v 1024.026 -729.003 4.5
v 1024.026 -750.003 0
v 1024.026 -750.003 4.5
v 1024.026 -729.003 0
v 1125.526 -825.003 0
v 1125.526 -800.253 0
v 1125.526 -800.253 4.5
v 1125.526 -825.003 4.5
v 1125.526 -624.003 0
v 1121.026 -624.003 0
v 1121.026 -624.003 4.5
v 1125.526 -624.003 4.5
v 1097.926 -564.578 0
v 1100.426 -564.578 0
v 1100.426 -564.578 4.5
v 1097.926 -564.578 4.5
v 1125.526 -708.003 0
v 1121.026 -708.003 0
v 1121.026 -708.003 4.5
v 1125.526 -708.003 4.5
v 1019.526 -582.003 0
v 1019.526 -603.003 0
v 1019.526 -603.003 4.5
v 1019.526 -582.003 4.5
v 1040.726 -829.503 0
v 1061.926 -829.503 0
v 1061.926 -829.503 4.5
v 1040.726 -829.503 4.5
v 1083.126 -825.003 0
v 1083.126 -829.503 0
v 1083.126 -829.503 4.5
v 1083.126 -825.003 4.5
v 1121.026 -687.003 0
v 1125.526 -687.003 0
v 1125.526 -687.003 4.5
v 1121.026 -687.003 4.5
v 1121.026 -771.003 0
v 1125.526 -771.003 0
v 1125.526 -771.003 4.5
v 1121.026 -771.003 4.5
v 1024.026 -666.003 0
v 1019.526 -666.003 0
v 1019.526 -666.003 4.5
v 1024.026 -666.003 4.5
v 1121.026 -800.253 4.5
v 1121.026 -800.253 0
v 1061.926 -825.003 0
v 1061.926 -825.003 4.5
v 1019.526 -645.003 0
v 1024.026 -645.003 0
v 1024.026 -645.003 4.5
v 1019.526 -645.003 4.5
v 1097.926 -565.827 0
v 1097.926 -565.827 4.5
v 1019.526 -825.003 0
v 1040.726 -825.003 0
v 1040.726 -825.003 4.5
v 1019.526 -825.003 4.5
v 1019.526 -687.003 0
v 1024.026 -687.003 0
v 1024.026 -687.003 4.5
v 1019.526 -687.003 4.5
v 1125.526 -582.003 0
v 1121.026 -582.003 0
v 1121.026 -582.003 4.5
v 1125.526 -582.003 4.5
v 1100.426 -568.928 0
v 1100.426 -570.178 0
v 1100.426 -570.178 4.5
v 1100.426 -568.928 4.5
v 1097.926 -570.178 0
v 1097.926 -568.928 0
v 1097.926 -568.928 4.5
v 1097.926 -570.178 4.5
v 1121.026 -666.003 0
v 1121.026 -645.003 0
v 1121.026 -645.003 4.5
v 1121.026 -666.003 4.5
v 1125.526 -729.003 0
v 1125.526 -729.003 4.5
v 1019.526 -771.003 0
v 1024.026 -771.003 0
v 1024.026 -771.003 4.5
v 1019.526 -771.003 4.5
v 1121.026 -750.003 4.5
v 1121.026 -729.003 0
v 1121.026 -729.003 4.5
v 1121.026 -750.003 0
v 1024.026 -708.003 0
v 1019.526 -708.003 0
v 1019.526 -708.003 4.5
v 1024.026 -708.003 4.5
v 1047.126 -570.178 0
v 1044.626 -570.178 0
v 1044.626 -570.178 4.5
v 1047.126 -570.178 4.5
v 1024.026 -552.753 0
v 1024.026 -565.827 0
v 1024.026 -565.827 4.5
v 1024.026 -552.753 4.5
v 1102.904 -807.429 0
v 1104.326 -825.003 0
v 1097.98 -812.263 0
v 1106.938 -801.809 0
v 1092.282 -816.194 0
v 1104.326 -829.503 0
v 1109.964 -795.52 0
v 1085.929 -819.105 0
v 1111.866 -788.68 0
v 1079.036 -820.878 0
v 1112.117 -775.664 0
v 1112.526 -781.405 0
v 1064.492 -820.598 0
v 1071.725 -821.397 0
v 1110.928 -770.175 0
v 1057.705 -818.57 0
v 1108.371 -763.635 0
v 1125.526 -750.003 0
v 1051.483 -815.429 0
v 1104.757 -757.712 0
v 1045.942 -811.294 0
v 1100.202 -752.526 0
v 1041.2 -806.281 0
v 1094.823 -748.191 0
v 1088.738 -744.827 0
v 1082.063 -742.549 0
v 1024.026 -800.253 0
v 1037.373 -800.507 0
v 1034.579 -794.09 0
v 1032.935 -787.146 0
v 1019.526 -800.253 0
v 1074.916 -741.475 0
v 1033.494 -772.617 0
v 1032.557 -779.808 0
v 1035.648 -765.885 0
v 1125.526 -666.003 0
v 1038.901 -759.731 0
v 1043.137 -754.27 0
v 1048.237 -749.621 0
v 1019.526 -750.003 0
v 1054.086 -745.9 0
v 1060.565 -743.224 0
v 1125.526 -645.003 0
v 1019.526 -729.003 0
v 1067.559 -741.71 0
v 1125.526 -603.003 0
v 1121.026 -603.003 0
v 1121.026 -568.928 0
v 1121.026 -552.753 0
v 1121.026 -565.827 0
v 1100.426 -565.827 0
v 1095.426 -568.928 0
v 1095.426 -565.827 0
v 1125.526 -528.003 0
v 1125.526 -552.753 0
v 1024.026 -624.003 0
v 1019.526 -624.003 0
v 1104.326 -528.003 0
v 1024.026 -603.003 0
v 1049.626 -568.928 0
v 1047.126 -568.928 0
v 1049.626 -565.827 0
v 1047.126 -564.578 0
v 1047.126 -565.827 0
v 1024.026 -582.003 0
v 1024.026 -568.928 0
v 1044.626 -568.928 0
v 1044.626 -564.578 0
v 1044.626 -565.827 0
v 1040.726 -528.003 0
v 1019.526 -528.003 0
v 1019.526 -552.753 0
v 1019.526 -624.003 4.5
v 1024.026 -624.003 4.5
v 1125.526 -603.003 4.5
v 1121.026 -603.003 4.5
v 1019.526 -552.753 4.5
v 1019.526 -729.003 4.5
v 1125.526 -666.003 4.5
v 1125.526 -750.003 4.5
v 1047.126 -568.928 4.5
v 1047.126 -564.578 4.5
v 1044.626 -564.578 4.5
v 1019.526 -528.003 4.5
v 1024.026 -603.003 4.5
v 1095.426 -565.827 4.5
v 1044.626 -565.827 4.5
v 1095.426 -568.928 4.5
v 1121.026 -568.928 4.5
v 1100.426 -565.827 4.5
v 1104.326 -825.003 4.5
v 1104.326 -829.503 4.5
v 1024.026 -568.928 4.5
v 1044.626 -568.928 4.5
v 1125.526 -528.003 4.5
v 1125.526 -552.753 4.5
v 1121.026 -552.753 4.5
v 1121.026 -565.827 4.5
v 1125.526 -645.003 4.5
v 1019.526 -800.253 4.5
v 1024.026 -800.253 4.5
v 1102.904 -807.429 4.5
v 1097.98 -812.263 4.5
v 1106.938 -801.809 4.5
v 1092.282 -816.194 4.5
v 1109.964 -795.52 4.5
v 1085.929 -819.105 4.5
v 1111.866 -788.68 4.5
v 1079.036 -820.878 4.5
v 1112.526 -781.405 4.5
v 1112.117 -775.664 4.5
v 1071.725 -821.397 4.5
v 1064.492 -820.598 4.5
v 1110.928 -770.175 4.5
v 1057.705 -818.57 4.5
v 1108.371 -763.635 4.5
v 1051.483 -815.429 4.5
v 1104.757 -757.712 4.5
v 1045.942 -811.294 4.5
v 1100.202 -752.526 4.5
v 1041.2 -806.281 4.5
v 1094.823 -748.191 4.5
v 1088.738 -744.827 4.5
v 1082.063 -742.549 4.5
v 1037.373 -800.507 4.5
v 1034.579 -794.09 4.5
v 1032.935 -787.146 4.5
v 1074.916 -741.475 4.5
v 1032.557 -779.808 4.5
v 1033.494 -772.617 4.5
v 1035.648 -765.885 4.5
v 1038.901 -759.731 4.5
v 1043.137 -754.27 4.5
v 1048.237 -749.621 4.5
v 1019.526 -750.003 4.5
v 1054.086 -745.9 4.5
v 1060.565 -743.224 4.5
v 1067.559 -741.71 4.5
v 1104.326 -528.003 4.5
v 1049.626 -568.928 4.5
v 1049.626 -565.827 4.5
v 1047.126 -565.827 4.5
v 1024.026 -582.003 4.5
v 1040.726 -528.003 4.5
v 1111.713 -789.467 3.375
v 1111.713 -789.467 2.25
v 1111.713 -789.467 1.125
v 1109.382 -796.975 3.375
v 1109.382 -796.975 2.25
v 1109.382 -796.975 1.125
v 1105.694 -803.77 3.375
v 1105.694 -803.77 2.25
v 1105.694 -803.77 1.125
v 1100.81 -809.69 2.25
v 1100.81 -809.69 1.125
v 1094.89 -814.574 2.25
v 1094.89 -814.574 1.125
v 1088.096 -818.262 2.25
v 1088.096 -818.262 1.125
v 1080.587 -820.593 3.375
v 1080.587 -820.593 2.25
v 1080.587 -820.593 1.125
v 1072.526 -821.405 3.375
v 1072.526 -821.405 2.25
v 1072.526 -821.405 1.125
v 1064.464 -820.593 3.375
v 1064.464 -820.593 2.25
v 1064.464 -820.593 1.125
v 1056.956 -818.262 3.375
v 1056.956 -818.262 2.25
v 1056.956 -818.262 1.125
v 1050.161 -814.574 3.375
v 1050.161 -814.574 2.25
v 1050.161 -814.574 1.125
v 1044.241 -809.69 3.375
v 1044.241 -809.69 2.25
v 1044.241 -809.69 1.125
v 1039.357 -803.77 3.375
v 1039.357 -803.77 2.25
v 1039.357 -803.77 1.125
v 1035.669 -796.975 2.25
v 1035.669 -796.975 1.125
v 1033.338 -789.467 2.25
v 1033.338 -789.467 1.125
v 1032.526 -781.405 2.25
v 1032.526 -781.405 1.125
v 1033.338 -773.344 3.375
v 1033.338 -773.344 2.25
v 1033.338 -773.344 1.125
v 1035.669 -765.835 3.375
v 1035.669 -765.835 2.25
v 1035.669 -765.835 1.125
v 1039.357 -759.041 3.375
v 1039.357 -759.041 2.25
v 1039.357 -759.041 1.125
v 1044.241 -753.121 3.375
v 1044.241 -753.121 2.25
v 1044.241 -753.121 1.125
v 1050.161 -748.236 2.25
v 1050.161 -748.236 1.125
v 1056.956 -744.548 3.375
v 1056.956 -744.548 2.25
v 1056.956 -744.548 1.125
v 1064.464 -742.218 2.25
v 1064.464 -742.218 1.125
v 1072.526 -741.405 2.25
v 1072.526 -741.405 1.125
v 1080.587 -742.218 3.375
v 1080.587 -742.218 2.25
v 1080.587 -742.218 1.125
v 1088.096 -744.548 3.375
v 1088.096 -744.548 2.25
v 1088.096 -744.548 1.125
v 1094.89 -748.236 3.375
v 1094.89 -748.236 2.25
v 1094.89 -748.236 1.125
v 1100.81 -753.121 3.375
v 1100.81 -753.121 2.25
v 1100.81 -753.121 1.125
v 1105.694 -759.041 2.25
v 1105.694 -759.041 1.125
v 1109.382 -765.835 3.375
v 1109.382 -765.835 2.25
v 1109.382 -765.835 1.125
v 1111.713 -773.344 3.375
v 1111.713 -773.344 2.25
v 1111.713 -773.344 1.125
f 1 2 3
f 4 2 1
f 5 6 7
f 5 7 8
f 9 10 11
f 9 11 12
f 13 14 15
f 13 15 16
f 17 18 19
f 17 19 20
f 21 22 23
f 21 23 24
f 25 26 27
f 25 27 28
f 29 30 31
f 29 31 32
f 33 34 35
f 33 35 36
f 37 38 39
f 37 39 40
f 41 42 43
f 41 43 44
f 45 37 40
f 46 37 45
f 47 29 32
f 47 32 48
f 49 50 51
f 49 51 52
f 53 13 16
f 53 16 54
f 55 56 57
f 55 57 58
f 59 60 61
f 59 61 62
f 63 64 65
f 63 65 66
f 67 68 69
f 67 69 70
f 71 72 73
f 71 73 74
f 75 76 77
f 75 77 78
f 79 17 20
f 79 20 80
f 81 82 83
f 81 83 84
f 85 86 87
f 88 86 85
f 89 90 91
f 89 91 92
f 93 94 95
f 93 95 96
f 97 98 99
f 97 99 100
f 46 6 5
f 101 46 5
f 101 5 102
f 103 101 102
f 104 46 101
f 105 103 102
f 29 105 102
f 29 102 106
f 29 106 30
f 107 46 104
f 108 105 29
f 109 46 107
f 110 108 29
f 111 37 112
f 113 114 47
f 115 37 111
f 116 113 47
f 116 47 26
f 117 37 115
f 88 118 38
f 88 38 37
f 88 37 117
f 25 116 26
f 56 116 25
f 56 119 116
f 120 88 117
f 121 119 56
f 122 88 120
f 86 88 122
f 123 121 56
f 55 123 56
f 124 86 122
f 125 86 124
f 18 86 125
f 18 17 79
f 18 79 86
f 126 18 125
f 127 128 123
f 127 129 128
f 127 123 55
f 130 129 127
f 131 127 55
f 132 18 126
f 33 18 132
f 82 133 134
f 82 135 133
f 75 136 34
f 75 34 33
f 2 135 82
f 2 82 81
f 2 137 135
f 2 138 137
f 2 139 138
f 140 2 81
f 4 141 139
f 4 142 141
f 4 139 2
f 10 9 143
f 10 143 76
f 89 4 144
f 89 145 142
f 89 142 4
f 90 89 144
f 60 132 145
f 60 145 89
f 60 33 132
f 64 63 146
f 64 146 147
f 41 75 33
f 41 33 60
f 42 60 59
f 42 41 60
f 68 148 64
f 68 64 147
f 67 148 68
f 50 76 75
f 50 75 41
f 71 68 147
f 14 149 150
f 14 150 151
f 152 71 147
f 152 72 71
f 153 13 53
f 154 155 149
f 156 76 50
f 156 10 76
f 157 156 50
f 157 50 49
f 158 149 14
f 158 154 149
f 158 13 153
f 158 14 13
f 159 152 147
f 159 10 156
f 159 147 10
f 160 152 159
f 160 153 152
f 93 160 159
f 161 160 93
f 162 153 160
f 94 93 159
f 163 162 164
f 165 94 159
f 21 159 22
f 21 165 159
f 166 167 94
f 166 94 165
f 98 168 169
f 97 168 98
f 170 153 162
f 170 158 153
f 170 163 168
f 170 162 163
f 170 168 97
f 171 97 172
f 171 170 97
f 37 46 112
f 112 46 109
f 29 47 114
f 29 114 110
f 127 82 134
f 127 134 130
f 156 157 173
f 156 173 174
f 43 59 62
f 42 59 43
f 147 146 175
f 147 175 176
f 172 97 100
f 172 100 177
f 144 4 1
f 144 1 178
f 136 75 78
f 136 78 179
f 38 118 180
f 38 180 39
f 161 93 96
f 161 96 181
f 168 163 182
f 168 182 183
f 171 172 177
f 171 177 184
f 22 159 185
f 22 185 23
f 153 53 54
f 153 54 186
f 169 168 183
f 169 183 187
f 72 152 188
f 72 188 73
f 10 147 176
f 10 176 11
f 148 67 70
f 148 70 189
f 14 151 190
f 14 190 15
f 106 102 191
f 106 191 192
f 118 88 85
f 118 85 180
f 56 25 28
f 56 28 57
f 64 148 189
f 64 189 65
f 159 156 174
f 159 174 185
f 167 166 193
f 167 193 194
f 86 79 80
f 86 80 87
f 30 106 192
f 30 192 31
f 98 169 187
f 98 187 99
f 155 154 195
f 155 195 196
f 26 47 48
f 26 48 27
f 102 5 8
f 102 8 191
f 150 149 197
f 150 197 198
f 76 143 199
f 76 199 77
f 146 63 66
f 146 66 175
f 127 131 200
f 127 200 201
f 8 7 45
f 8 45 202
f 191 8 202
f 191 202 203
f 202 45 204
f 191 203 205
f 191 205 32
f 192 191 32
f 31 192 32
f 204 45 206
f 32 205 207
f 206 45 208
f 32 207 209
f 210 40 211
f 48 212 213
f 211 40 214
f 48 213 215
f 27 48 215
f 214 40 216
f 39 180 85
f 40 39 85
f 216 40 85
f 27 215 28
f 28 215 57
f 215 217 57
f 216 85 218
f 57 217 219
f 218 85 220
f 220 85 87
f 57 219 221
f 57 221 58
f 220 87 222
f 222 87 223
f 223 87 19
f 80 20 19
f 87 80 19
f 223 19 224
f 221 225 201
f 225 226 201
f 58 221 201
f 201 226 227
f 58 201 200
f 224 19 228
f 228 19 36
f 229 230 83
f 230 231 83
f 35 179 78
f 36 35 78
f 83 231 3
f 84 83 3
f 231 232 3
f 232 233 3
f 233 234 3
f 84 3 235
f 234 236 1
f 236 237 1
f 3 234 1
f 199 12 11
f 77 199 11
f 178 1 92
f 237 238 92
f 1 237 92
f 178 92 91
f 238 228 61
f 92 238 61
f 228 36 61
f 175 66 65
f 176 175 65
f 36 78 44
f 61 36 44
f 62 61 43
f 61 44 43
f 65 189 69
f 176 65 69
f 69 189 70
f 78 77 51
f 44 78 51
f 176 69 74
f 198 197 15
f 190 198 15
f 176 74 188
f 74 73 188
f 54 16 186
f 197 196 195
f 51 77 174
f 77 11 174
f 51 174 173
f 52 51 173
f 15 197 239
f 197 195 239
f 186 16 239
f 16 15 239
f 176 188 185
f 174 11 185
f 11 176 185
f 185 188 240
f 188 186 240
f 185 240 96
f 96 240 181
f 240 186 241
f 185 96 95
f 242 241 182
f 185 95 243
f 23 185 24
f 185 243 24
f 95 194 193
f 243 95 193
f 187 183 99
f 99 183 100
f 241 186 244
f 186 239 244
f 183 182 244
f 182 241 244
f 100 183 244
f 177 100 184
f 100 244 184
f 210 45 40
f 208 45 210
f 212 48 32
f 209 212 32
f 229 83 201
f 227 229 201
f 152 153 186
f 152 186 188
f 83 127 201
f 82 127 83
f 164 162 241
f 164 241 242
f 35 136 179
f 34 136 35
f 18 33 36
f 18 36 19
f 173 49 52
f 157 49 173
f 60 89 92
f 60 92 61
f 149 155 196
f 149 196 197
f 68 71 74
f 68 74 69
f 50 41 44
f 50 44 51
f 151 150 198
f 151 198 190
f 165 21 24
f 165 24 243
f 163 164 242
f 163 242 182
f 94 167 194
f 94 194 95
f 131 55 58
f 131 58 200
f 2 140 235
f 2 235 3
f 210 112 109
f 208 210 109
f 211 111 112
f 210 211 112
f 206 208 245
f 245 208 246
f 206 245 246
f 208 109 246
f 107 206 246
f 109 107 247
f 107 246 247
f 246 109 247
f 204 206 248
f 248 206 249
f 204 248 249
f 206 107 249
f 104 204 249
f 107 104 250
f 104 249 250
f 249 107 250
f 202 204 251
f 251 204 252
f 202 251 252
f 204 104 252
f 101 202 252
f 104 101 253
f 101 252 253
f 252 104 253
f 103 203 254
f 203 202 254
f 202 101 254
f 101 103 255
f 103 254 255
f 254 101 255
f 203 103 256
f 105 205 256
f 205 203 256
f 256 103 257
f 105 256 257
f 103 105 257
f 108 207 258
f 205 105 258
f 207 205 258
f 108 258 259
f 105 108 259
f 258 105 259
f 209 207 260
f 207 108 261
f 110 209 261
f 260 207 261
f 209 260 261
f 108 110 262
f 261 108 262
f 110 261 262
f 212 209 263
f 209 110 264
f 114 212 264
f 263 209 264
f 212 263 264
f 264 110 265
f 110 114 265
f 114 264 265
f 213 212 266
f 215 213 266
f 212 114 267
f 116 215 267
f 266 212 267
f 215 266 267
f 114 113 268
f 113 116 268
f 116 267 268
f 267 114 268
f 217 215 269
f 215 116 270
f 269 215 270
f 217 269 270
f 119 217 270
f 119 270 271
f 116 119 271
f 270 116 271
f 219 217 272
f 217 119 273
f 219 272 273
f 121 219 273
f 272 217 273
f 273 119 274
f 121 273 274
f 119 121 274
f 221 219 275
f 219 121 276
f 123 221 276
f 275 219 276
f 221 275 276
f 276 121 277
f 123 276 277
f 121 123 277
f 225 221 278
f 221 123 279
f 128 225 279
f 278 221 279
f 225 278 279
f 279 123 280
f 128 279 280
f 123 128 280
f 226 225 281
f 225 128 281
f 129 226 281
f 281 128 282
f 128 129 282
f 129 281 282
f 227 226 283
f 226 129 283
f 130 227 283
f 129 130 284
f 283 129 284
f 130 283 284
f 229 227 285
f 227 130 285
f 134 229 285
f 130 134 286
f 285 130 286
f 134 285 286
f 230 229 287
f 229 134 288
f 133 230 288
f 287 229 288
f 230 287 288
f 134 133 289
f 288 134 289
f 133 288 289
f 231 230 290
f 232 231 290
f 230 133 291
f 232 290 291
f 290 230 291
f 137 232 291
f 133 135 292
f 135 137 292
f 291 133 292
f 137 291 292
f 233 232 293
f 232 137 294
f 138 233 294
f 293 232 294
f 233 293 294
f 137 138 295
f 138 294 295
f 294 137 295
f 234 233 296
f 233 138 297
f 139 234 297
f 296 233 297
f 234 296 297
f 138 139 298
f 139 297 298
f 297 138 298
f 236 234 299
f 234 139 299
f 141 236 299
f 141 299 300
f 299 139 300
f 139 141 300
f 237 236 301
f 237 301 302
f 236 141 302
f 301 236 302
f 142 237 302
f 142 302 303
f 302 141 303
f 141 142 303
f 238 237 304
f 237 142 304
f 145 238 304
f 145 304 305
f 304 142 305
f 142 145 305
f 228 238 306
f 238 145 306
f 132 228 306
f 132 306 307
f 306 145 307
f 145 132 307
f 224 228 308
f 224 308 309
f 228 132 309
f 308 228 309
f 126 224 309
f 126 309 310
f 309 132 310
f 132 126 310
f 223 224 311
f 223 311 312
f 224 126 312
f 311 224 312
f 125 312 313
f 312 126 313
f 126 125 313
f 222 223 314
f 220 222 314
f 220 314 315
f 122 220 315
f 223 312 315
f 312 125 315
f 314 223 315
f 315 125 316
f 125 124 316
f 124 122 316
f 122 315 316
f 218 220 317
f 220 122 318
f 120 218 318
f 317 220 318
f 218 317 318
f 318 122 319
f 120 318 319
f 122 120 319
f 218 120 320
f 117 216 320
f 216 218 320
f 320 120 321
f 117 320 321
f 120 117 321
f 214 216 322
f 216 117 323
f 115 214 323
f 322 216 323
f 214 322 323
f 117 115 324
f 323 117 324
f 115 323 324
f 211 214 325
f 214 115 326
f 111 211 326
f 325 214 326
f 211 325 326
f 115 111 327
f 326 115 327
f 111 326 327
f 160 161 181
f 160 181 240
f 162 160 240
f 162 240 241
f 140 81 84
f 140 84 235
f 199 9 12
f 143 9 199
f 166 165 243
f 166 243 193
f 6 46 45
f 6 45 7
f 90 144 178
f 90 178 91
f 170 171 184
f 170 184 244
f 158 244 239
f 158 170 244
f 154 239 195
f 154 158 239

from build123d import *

# Parameters (mm, degrees)
BOSS_EXTRUDE1_DEPTH = 4.5


with BuildPart() as part:
    # Model → Boss-Extrude1 (new body)
    with BuildSketch(Plane.XY):
        with BuildLine():
            Line((1024.025694188, -784.077715082), (1024.025694188, -771.002535918))
            Line((1024.025694188, -771.002535918), (1019.525696134, -771.002535918))
            Line((1019.525696134, -771.002535918), (1019.525696134, -750.002627312))
            Line((1019.525696134, -750.002627312), (1024.025694188, -750.002627312))
            Line((1024.025694188, -750.002627312), (1024.025694188, -729.002718707))
            Line((1024.025694188, -729.002718707), (1019.525696134, -729.002718707))
            Line((1019.525696134, -729.002718707), (1019.525696134, -708.002774823))
            Line((1019.525696134, -708.002774823), (1024.025694188, -708.002774823))
            Line((1024.025694188, -708.002774823), (1024.025694188, -687.002513439))
            Line((1024.025694188, -687.002513439), (1019.525696134, -687.002513439))
            Line((1019.525696134, -687.002513439), (1019.525696134, -666.002569556))
            Line((1019.525696134, -666.002569556), (1024.025694188, -666.002569556))
            Line((1024.025694188, -666.002569556), (1024.025694188, -645.00266095))
            Line((1024.025694188, -645.00266095), (1019.525696134, -645.00266095))
            Line((1019.525696134, -645.00266095), (1019.525696134, -624.002752344))
            Line((1019.525696134, -624.002752344), (1024.025694188, -624.002752344))
            Line((1024.025694188, -624.002752344), (1024.025694188, -603.00280846))
            Line((1024.025694188, -603.00280846), (1019.525696134, -603.00280846))
            Line((1019.525696134, -603.00280846), (1019.525696134, -582.002547077))
            Line((1019.525696134, -582.002547077), (1024.025694188, -582.002547077))
            Line((1024.025694188, -582.002547077), (1024.025694188, -568.927720691))
            Line((1024.025694188, -568.927720691), (1044.62562335, -568.927720691))
            Line((1044.62562335, -568.927720691), (1044.62562335, -570.177612357))
            Line((1044.62562335, -570.177612357), (1047.125724183, -570.177612357))
            Line((1047.125724183, -570.177612357), (1047.125724183, -568.927720691))
            Line((1047.125724183, -568.927720691), (1049.625825015, -568.927720691))
            Line((1049.625825015, -568.927720691), (1049.625825015, -565.827474303))
            Line((1049.625825015, -565.827474303), (1047.125724183, -565.827474303))
            Line((1047.125724183, -565.827474303), (1047.125724183, -564.577582637))
            Line((1047.125724183, -564.577582637), (1044.62562335, -564.577582637))
            Line((1044.62562335, -564.577582637), (1044.62562335, -565.827474303))
            Line((1044.62562335, -565.827474303), (1024.025694188, -565.827474303))
            Line((1024.025694188, -565.827474303), (1024.025694188, -552.752647917))
            Line((1024.025694188, -552.752647917), (1019.525696134, -552.752647917))
            Line((1019.525696134, -552.752647917), (1019.525696134, -528.002746812))
            Line((1019.525696134, -528.002746812), (1040.725770851, -528.002746812))
            add(Edge.make_bspline(
                [(1072.525724176, -528.002746812), (1054.962964736, -528.002746812), (1040.725770851, -528.002746812)],
                knots=[3, 3, 3, 4, 4, 4], degree=2))
            add(Edge.make_bspline(
                [(1104.325677502, -528.002746812), (1090.088483616, -528.002746812), (1072.525724176, -528.002746812)],
                knots=[2, 2, 2, 3, 3, 3], degree=2))
            Line((1104.325677502, -528.002746812), (1125.525787496, -528.002746812))
            Line((1125.525787496, -528.002746812), (1125.525787496, -552.752647917))
            Line((1125.525787496, -552.752647917), (1121.025789442, -552.752647917))
            Line((1121.025789442, -552.752647917), (1121.025789442, -565.827474303))
            Line((1121.025789442, -565.827474303), (1100.425825003, -565.827474303))
            Line((1100.425825003, -565.827474303), (1100.425825003, -564.577582637))
            Line((1100.425825003, -564.577582637), (1097.92572417, -564.577582637))
            Line((1097.92572417, -564.577582637), (1097.92572417, -565.827474303))
            Line((1097.92572417, -565.827474303), (1095.425623337, -565.827474303))
            Line((1095.425623337, -565.827474303), (1095.425623337, -568.927720691))
            Line((1095.425623337, -568.927720691), (1097.92572417, -568.927720691))
            Line((1097.92572417, -568.927720691), (1097.92572417, -570.177612357))
            Line((1097.92572417, -570.177612357), (1100.425825003, -570.177612357))
            Line((1100.425825003, -570.177612357), (1100.425825003, -568.927720691))
            Line((1100.425825003, -568.927720691), (1121.025789442, -568.927720691))
            Line((1121.025789442, -568.927720691), (1121.025789442, -582.002547077))
            Line((1121.025789442, -582.002547077), (1125.525787496, -582.002547077))
            Line((1125.525787496, -582.002547077), (1125.525787496, -603.00280846))
            Line((1125.525787496, -603.00280846), (1121.025789442, -603.00280846))
            Line((1121.025789442, -603.00280846), (1121.025789442, -624.002752344))
            Line((1121.025789442, -624.002752344), (1125.525787496, -624.002752344))
            Line((1125.525787496, -624.002752344), (1125.525787496, -645.00266095))
            Line((1125.525787496, -645.00266095), (1121.025789442, -645.00266095))
            Line((1121.025789442, -645.00266095), (1121.025789442, -666.002569556))
            Line((1121.025789442, -666.002569556), (1125.525787496, -666.002569556))
            Line((1125.525787496, -666.002569556), (1125.525787496, -687.002513439))
            Line((1125.525787496, -687.002513439), (1121.025789442, -687.002513439))
            Line((1121.025789442, -687.002513439), (1121.025789442, -708.002774823))
            Line((1121.025789442, -708.002774823), (1125.525787496, -708.002774823))
            Line((1125.525787496, -708.002774823), (1125.525787496, -729.002718707))
            Line((1125.525787496, -729.002718707), (1121.025789442, -729.002718707))
            Line((1121.025789442, -729.002718707), (1121.025789442, -750.002627312))
            Line((1121.025789442, -750.002627312), (1125.525787496, -750.002627312))
            Line((1125.525787496, -750.002627312), (1125.525787496, -771.002535918))
            Line((1125.525787496, -771.002535918), (1121.025789442, -771.002535918))
            Line((1121.025789442, -771.002535918), (1121.025789442, -784.077715082))
            Line((1121.025789442, -784.077715082), (1121.025789442, -787.177608692))
            Line((1121.025789442, -787.177608692), (1121.025789442, -800.252787855))
            Line((1121.025789442, -800.252787855), (1125.525787496, -800.252787855))
            Line((1125.525787496, -800.252787855), (1125.525787496, -825.00268896))
            Line((1125.525787496, -825.00268896), (1104.325677502, -825.00268896))
            Line((1104.325677502, -825.00268896), (1104.325677502, -829.502687015))
            Line((1104.325677502, -829.502687015), (1083.125955563, -829.502687015))
            Line((1083.125955563, -829.502687015), (1083.125955563, -825.00268896))
            Line((1083.125955563, -825.00268896), (1074.07568862, -825.00268896))
            Line((1074.07568862, -825.00268896), (1070.97579501, -825.00268896))
            Line((1070.97579501, -825.00268896), (1061.925528068, -825.00268896))
            Line((1061.925528068, -825.00268896), (1061.925528068, -829.502687015))
            Line((1061.925528068, -829.502687015), (1040.725770851, -829.502687015))
            Line((1040.725770851, -829.502687015), (1040.725770851, -825.00268896))
            Line((1040.725770851, -825.00268896), (1019.525696134, -825.00268896))
            Line((1019.525696134, -825.00268896), (1019.525696134, -800.252787855))
            Line((1019.525696134, -800.252787855), (1024.025694188, -800.252787855))
            Line((1024.025694188, -800.252787855), (1024.025694188, -787.177608692))
            Line((1024.025694188, -787.177608692), (1024.025694188, -784.077715082))
        make_face()
        with BuildLine():
            add(Edge.make_bspline(
                [(1032.525768909, -781.405176471), (1032.525768909, -759.313702866), (1050.434391682, -741.405044815), (1072.525724176, -741.405044815), (1094.617056671, -741.405044815), (1112.525714722, -759.313702866), (1112.525714722, -781.405176471)],
                knots=[2, 2, 2, 2, 3, 3, 3, 4, 4, 4, 4], degree=3))
            add(Edge.make_bspline(
                [(1112.525714722, -781.405176471), (1112.525714722, -803.496685355), (1094.617056671, -821.405343406), (1072.525724176, -821.405343406), (1050.434391682, -821.405343406), (1032.525768909, -803.496685355), (1032.525768909, -781.405176471)],
                knots=[0, 0, 0, 0, 1, 1, 1, 2, 2, 2, 2], degree=3))
        make_face(mode=Mode.SUBTRACT)
    extrude(amount=BOSS_EXTRUDE1_DEPTH)


solid = part.part
